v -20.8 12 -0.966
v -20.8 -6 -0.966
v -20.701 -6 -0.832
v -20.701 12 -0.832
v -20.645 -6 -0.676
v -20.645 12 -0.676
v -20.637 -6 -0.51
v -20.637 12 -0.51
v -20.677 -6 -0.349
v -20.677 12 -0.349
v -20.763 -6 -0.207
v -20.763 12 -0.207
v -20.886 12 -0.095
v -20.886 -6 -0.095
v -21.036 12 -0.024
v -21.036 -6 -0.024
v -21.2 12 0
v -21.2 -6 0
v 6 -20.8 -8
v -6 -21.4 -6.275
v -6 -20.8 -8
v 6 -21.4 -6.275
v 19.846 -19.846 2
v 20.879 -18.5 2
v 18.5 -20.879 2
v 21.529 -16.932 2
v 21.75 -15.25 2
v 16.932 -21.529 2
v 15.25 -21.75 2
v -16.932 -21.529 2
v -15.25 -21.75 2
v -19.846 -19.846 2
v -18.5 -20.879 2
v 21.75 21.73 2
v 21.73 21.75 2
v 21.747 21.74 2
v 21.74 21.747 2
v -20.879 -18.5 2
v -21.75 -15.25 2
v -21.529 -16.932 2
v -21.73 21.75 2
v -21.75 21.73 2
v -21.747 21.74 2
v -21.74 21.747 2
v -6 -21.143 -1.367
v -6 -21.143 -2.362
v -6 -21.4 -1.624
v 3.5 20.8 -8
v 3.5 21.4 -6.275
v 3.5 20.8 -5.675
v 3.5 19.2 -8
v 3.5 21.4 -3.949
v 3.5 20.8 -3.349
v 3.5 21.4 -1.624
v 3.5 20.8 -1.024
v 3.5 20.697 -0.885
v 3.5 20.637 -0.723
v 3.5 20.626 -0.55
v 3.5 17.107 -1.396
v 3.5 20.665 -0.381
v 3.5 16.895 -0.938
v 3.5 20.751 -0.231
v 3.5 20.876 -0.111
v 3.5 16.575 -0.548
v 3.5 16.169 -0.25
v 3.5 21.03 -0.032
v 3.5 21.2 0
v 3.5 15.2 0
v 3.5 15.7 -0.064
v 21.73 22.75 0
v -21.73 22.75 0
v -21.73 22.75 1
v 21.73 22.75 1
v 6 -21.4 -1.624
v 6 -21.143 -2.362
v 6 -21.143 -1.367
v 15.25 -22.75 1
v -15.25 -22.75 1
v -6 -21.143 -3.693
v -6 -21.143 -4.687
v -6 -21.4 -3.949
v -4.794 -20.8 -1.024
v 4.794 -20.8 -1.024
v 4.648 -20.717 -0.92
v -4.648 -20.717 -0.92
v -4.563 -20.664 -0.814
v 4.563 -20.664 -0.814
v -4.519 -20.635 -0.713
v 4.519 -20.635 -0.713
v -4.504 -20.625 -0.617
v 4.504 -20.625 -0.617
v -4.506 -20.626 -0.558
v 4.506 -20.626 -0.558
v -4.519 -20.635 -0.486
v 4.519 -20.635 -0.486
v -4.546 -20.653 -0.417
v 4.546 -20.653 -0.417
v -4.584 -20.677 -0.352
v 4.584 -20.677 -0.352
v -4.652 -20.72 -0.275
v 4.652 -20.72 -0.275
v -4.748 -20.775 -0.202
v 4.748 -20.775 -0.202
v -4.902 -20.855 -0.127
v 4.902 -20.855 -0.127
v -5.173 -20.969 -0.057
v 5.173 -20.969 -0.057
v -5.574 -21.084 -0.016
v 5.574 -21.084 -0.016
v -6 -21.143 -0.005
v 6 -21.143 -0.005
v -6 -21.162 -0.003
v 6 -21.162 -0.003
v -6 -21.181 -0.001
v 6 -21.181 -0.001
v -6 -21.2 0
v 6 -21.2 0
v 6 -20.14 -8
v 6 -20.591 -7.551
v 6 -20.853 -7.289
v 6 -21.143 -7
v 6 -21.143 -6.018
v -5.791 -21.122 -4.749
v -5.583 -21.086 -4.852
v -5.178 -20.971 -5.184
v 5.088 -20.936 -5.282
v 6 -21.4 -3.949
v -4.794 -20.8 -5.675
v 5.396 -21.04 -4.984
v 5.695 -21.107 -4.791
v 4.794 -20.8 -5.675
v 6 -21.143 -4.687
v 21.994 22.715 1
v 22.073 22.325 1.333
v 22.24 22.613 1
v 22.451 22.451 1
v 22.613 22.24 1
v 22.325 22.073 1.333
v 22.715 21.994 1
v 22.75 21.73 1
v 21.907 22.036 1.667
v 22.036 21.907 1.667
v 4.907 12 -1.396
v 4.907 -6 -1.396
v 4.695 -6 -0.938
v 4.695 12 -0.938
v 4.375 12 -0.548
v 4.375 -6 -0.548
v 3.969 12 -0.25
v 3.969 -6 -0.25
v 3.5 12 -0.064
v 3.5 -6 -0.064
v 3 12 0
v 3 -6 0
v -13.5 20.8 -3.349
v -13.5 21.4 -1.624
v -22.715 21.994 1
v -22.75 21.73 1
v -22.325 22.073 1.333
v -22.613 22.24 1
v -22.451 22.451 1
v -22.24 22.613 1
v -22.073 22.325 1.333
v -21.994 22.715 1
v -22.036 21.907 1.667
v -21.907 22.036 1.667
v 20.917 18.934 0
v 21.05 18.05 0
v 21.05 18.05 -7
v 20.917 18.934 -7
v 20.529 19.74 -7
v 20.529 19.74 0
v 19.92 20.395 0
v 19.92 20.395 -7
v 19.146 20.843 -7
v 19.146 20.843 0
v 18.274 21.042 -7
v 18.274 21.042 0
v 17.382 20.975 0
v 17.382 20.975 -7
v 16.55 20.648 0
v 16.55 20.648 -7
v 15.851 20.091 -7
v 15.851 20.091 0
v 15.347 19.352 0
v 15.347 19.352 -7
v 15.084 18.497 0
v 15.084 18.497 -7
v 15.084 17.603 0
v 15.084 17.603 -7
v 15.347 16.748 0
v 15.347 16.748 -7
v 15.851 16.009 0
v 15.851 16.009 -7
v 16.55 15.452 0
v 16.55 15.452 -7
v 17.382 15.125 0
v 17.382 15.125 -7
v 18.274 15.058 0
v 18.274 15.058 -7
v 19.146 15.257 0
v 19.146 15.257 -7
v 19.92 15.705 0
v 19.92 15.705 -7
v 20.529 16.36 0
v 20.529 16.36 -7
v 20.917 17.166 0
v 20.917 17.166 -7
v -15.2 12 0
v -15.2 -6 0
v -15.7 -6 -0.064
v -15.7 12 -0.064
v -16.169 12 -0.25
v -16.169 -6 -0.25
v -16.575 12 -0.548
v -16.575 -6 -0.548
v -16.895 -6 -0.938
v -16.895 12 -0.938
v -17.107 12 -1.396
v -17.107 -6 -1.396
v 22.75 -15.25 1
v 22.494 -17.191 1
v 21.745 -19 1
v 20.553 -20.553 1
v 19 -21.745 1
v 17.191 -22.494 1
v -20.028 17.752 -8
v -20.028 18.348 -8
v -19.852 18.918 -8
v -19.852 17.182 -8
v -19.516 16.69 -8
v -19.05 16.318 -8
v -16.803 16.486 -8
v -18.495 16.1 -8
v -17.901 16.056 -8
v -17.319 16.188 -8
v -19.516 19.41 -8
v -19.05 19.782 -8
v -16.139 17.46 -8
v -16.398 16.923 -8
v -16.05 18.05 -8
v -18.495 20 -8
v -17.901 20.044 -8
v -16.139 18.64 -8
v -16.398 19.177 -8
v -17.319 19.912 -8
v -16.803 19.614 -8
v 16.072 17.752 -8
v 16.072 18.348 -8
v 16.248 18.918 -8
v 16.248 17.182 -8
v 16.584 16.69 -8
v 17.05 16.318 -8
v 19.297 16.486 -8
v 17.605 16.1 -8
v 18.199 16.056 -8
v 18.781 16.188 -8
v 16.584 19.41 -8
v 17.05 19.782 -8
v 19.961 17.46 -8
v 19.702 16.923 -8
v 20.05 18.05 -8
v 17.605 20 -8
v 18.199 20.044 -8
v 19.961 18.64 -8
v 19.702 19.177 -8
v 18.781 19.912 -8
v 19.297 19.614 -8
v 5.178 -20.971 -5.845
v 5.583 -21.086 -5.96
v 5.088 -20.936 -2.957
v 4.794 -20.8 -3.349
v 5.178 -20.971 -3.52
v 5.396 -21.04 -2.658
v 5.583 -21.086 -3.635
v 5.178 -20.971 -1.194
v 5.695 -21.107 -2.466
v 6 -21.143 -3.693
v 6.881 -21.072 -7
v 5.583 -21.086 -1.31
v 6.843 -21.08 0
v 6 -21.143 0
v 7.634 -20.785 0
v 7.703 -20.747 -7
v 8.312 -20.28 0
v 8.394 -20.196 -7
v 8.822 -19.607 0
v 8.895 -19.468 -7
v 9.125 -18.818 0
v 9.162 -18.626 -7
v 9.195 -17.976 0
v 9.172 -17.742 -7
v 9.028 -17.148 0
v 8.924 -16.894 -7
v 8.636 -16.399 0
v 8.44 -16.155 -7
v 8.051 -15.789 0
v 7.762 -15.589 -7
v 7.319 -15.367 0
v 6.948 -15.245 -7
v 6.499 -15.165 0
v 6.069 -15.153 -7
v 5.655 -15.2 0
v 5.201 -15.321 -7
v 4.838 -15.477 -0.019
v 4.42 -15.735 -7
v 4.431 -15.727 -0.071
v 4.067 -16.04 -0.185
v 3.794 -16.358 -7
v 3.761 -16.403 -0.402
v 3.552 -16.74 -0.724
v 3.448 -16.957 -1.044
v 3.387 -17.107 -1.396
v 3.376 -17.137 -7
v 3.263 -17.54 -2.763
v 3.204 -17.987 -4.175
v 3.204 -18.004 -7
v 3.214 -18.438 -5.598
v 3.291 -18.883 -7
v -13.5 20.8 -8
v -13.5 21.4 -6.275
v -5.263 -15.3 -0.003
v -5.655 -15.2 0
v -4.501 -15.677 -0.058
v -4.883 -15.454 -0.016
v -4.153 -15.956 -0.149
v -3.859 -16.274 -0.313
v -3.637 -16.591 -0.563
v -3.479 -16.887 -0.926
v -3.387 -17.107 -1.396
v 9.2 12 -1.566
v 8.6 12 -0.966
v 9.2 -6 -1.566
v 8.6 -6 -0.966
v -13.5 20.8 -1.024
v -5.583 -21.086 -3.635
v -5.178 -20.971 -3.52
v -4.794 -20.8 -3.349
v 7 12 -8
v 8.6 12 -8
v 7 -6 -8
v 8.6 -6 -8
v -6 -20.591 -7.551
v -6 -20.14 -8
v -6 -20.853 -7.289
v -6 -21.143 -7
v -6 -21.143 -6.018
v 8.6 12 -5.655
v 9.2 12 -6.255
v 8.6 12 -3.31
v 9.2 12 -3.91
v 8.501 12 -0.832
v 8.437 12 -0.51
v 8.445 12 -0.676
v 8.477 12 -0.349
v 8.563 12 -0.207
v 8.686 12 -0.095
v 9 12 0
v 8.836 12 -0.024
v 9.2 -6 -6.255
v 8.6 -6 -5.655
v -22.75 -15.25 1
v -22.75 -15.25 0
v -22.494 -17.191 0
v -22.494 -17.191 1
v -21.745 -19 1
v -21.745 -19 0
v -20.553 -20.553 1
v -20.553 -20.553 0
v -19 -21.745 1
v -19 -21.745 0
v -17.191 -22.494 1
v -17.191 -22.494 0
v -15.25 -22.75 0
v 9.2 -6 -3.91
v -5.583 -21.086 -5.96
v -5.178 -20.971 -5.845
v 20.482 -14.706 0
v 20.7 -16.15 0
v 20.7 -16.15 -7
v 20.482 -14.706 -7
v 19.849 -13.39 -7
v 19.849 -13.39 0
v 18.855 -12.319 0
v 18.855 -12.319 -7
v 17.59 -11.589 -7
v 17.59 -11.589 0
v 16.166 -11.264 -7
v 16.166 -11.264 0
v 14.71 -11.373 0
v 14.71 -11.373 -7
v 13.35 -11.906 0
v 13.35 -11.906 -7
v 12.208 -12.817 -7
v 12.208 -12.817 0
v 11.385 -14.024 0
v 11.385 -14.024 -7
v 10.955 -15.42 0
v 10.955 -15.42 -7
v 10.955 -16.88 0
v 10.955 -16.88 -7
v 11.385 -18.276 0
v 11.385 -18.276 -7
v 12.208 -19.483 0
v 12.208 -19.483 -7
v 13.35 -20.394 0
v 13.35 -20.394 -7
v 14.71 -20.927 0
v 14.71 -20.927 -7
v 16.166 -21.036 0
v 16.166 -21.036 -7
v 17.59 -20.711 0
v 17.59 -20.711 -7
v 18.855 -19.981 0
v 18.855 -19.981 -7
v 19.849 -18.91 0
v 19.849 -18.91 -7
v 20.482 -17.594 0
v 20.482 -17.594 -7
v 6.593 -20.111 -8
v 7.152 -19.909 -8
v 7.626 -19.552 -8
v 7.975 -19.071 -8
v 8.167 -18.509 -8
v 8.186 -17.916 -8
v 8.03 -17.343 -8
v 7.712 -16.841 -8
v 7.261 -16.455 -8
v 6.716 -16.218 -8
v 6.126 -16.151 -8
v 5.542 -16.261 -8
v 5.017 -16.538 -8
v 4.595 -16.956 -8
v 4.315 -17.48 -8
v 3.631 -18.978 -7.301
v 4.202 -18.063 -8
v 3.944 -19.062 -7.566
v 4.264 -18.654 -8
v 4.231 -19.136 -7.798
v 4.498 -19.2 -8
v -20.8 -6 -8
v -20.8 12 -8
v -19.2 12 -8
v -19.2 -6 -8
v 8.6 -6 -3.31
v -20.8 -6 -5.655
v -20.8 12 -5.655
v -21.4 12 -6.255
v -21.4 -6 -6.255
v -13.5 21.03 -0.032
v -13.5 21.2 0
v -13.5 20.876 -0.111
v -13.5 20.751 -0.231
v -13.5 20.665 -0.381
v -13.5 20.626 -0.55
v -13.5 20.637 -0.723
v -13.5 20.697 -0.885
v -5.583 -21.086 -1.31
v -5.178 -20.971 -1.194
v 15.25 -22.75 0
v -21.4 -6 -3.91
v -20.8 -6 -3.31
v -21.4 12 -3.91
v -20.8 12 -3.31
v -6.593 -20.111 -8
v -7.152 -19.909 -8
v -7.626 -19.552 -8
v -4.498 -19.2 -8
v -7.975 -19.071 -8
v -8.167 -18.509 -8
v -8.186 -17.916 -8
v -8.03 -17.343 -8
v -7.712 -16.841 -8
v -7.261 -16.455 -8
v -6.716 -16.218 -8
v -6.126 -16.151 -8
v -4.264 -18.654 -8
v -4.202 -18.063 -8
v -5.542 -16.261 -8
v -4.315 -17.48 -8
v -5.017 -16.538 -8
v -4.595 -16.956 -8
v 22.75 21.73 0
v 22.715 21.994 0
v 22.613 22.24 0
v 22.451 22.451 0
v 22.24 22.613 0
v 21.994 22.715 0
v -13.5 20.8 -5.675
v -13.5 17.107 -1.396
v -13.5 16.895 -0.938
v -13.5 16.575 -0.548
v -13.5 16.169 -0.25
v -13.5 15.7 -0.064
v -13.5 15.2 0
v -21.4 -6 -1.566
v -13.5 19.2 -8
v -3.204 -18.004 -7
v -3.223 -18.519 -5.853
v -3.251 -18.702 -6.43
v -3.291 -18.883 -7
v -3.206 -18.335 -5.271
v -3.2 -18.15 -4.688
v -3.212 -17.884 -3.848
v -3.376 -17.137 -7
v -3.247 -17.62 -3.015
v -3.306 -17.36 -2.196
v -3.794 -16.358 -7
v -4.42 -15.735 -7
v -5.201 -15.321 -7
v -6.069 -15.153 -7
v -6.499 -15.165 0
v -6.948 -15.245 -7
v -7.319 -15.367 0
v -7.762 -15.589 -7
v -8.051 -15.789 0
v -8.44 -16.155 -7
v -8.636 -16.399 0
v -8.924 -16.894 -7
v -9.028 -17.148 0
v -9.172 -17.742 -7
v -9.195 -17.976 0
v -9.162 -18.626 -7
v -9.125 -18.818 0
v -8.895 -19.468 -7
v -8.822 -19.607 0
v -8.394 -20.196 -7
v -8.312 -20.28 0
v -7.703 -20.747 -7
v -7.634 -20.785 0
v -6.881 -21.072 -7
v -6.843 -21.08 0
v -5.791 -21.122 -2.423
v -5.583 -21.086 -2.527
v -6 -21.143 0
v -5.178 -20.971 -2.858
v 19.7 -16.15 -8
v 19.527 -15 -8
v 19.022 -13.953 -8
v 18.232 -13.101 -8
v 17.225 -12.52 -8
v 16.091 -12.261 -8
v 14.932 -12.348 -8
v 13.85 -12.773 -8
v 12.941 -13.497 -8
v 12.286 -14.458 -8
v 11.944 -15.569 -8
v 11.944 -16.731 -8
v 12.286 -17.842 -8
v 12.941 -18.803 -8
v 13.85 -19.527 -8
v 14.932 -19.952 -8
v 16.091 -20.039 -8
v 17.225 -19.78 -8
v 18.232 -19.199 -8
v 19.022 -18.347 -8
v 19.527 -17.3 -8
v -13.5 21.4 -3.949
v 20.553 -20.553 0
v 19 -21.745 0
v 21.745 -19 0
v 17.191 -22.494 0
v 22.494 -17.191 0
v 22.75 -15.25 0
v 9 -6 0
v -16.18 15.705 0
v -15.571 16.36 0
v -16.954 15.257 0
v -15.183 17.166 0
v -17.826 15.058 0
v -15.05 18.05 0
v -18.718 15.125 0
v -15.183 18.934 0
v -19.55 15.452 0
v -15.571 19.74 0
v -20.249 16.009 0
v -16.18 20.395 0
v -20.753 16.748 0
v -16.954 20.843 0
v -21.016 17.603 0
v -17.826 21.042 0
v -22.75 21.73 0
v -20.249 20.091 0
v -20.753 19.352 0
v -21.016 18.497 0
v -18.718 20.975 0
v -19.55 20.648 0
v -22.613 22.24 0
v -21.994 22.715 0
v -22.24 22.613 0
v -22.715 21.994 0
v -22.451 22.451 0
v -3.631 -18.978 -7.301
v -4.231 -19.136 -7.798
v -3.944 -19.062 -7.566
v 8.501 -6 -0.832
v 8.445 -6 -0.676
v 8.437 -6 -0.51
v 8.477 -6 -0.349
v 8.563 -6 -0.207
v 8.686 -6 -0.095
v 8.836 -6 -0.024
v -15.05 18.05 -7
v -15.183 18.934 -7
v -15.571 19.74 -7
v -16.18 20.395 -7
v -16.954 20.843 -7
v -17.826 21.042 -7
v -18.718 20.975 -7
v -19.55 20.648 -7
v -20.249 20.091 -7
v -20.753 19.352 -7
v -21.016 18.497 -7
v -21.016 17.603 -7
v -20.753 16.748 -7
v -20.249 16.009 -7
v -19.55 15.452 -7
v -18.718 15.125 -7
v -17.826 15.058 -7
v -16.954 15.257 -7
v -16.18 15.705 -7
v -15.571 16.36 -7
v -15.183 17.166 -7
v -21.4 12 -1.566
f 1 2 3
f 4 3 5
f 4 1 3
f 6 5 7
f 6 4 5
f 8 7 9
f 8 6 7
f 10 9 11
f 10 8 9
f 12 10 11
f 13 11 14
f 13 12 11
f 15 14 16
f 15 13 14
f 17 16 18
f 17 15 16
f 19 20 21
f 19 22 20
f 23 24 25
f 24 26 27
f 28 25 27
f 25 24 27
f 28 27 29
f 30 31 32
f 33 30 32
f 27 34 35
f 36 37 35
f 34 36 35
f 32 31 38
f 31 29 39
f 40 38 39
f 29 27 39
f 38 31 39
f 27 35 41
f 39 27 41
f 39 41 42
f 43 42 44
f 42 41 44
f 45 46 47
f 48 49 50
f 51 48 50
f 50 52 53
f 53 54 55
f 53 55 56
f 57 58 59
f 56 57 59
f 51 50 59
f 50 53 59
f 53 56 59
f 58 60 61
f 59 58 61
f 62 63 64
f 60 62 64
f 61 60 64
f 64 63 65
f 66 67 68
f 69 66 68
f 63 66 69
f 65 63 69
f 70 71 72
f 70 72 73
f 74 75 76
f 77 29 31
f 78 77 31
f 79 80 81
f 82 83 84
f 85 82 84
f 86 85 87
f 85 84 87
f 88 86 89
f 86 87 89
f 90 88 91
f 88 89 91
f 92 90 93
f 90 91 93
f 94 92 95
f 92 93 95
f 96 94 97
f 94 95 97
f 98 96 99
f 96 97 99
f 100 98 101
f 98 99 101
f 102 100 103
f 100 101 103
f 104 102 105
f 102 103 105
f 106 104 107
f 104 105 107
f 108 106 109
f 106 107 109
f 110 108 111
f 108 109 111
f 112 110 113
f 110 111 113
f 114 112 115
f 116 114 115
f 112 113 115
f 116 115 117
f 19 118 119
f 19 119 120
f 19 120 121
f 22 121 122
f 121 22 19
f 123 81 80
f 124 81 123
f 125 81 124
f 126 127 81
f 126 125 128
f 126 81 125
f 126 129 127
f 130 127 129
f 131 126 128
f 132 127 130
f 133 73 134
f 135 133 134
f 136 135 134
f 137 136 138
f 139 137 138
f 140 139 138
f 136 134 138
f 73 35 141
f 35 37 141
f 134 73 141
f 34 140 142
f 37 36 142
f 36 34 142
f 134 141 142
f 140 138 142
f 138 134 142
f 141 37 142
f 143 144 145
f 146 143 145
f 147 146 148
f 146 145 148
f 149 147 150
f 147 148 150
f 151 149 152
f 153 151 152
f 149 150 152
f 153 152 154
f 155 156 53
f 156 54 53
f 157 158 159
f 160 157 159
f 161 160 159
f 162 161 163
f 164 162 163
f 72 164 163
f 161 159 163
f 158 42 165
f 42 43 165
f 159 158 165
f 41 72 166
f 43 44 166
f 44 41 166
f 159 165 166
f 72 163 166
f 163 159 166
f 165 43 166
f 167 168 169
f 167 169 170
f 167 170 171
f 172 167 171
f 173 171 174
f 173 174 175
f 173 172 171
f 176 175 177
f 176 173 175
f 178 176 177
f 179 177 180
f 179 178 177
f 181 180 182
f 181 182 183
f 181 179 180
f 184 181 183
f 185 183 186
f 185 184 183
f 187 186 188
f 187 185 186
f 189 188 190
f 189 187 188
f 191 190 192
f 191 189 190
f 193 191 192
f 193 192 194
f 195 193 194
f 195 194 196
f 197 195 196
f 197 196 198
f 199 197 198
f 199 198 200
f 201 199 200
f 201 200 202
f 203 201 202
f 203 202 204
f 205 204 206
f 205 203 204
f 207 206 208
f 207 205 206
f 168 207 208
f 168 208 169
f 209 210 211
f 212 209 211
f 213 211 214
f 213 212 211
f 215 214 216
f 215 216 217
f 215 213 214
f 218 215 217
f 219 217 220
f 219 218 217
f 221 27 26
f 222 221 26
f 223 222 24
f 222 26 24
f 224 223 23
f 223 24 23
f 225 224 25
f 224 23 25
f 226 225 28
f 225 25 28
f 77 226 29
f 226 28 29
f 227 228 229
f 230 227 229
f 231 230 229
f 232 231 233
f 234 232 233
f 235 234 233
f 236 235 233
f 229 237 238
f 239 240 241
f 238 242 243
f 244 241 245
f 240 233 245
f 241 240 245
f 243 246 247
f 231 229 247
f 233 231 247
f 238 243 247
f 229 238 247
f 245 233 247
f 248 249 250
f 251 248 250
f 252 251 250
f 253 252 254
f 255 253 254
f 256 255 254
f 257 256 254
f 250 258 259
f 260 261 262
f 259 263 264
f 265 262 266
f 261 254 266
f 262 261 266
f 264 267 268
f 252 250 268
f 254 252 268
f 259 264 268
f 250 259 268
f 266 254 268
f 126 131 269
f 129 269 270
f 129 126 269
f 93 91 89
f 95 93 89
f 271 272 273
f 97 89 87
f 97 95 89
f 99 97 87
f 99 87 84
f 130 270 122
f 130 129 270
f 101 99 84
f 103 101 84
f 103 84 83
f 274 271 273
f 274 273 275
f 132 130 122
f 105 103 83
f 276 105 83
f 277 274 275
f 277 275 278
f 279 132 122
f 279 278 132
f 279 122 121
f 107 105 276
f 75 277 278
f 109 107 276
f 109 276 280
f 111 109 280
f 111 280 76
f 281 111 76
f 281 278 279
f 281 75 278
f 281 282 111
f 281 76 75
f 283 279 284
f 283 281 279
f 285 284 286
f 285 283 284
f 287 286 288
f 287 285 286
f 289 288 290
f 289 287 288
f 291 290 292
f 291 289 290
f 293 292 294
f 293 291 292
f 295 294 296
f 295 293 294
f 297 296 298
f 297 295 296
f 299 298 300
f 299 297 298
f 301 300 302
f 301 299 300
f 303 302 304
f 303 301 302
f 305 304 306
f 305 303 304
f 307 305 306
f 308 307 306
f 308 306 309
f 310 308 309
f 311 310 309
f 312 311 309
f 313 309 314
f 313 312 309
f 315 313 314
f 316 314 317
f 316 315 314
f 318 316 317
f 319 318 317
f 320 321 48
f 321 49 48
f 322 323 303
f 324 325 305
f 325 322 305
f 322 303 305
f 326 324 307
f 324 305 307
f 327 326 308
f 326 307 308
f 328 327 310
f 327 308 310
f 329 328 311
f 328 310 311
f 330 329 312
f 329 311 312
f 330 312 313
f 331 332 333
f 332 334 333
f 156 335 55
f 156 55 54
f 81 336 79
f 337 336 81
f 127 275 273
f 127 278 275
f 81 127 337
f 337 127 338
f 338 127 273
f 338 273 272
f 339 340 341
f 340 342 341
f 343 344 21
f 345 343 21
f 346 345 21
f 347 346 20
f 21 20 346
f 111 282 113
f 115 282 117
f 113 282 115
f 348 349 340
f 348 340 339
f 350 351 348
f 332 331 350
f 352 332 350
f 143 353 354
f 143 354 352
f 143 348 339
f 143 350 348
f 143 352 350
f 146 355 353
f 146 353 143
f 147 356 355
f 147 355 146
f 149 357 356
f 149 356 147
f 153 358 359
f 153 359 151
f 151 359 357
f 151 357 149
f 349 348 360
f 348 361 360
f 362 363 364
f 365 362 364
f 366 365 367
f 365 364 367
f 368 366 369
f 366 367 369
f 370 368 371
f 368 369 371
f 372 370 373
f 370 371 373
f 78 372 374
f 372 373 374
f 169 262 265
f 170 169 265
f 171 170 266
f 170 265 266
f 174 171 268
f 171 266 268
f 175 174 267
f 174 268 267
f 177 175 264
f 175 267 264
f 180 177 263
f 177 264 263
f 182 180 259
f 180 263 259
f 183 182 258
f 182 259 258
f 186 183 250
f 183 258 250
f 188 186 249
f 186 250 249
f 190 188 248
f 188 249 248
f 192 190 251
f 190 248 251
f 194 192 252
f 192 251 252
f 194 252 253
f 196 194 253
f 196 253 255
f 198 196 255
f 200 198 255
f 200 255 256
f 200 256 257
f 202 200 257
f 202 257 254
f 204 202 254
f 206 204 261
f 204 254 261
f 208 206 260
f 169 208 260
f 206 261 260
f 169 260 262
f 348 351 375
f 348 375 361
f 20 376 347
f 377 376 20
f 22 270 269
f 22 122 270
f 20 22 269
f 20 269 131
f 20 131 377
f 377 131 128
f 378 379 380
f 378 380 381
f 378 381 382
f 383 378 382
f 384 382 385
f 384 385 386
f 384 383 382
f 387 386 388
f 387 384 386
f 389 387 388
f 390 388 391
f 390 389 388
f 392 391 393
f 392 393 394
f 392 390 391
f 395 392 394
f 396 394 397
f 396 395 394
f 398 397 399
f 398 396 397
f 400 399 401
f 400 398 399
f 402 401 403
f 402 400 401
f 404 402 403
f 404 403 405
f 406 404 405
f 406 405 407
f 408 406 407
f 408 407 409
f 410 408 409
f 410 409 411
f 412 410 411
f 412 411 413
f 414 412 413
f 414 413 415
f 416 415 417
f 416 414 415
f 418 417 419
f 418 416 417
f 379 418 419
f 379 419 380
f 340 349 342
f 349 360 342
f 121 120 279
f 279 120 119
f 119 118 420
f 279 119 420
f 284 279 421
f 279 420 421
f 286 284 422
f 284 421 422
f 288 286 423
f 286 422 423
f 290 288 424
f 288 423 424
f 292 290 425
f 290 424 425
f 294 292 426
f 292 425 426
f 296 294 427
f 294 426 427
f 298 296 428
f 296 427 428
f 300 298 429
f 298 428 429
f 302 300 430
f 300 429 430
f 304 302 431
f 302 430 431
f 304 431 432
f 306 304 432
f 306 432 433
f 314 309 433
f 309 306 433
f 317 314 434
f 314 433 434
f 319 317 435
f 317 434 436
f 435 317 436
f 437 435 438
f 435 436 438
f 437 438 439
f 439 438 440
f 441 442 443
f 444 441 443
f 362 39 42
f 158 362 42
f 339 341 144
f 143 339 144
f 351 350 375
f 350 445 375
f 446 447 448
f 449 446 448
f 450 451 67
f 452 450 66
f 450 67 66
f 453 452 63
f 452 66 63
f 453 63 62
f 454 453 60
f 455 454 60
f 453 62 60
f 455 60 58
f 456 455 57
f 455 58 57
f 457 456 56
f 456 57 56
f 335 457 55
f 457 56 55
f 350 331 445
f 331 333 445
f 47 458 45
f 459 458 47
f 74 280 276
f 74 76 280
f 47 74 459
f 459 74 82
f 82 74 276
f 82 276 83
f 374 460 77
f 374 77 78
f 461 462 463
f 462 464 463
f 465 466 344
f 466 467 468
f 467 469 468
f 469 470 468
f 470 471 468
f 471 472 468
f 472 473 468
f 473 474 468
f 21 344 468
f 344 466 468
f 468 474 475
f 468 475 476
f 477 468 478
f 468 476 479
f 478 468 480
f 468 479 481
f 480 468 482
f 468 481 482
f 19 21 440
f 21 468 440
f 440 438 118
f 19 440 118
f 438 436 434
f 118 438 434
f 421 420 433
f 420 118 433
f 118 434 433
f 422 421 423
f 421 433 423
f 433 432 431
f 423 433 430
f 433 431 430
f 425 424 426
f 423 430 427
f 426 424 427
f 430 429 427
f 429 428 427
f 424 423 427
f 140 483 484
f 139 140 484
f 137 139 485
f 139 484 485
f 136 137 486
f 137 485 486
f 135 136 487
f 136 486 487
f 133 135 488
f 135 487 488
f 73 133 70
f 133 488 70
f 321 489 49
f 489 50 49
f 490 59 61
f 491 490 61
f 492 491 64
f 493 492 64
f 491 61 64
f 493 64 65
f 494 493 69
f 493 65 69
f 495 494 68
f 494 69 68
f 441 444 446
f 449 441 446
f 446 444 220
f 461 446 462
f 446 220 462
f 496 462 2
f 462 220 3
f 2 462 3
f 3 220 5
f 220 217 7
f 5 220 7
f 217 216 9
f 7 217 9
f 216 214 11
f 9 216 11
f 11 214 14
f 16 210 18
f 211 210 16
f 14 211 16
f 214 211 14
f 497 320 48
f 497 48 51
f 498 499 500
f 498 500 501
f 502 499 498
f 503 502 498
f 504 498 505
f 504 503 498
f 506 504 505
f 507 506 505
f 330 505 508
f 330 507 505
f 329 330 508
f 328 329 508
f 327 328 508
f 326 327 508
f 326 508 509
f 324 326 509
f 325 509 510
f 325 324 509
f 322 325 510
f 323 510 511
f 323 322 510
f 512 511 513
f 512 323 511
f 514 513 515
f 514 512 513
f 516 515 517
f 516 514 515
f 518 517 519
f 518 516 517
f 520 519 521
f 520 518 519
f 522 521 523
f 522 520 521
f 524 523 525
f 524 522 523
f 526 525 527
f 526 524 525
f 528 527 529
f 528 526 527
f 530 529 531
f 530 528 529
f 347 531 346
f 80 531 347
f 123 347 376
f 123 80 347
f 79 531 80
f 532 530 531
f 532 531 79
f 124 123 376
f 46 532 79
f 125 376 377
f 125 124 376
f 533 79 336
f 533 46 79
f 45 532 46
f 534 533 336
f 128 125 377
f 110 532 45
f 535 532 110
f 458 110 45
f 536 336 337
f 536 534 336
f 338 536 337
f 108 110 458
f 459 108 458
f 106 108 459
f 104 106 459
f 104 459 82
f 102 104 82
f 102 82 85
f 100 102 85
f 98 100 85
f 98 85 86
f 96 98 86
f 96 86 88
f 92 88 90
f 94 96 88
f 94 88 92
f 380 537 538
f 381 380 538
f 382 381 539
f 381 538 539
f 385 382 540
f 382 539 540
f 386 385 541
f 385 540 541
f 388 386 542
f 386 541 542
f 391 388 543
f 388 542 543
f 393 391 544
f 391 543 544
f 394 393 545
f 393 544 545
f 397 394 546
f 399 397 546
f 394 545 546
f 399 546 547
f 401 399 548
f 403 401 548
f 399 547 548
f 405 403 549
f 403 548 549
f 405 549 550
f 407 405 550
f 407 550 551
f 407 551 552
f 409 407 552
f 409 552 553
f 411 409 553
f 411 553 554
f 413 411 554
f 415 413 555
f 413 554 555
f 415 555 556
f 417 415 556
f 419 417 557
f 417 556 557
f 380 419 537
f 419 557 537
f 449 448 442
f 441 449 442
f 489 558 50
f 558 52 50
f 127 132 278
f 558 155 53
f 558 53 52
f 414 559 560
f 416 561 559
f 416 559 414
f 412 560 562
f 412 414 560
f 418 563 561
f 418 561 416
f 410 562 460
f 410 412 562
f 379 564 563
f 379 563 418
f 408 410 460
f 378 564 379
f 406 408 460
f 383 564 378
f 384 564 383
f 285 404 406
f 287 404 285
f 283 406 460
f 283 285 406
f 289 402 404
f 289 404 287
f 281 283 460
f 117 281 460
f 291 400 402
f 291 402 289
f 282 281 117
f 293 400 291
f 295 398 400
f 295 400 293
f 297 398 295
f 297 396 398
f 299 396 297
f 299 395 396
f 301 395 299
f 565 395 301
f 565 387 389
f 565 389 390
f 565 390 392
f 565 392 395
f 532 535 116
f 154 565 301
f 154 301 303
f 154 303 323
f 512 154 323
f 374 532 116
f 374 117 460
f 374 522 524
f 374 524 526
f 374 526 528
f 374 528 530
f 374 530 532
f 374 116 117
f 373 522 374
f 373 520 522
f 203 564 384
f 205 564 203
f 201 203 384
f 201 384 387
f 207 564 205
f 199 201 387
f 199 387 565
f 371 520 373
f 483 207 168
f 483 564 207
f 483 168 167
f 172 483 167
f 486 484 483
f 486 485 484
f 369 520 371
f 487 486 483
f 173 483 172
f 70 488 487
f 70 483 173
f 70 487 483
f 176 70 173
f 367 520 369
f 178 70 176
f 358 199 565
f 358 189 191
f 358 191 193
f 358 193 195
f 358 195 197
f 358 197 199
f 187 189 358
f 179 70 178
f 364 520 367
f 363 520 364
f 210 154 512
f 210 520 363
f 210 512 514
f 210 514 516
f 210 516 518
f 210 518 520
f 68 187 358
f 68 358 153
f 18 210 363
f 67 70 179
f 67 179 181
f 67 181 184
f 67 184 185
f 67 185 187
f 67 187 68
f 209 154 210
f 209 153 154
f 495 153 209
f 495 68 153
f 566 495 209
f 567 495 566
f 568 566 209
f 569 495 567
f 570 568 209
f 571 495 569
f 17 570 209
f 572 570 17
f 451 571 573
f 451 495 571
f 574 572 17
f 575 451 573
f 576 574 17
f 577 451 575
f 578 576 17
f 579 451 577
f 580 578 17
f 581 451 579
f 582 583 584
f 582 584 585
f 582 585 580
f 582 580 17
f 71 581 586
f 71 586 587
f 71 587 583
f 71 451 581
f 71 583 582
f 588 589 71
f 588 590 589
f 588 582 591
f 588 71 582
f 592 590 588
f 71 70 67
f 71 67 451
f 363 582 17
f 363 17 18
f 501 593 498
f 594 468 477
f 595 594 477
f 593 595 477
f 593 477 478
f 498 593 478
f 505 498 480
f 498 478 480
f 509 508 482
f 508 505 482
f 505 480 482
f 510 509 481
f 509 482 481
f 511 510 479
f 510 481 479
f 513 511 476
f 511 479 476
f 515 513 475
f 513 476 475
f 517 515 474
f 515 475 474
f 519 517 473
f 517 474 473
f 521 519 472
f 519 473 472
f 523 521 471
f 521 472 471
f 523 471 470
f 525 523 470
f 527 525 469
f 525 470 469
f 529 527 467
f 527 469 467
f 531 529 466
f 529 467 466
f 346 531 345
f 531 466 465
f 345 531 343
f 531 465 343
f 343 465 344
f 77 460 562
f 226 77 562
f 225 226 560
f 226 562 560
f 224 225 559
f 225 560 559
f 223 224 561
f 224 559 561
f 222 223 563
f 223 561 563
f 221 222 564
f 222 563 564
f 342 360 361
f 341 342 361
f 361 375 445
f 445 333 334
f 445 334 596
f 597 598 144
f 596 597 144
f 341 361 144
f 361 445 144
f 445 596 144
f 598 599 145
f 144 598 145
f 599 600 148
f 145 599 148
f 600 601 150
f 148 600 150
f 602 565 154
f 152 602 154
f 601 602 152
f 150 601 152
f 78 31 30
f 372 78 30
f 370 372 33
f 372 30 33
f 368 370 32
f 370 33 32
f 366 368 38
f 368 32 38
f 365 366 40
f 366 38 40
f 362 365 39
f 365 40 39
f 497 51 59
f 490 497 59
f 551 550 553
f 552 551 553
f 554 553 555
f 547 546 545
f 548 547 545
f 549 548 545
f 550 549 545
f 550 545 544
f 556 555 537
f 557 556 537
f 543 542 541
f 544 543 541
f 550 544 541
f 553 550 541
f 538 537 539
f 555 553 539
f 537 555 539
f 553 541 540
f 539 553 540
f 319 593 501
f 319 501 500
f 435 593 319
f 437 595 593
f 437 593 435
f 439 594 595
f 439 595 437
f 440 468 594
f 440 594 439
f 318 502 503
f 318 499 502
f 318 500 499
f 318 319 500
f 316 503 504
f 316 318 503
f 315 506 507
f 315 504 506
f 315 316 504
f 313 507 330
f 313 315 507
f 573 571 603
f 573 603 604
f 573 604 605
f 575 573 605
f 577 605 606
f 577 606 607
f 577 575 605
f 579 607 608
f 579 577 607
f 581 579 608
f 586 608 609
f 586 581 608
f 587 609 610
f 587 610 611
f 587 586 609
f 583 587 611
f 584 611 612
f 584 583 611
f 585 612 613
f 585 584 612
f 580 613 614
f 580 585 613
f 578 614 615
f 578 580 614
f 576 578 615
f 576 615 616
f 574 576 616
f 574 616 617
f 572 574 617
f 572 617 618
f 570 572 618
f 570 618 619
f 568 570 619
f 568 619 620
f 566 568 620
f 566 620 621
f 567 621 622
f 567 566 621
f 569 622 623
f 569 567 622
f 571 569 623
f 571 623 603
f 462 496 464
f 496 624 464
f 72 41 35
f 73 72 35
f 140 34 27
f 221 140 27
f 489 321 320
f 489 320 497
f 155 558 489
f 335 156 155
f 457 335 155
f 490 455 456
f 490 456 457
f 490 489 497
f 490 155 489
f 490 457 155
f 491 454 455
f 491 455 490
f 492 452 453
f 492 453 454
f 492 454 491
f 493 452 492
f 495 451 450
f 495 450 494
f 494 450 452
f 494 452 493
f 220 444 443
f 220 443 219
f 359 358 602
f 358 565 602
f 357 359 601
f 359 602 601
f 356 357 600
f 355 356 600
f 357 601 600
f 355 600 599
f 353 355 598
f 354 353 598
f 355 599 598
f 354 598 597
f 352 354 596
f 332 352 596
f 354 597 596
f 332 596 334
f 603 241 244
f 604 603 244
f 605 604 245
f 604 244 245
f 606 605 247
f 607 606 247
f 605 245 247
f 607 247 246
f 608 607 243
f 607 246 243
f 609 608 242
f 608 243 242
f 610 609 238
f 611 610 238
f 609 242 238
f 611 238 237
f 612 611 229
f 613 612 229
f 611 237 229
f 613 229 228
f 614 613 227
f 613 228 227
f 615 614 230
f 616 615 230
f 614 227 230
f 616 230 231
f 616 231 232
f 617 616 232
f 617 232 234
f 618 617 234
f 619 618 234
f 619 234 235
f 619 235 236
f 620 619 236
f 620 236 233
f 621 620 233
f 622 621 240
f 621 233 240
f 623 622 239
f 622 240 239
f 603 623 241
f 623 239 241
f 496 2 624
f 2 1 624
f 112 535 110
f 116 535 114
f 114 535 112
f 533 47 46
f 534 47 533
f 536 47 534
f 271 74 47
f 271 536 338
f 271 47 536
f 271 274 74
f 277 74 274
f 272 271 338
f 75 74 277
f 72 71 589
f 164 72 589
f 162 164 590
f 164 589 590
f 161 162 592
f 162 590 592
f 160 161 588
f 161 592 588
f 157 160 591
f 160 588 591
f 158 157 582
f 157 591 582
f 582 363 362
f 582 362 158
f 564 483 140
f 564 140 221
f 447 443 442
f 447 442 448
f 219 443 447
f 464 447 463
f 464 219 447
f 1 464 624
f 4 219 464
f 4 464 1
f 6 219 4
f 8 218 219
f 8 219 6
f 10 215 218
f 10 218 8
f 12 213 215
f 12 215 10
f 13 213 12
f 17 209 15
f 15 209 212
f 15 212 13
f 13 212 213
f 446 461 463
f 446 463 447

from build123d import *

# Parameters (mm, degrees)
PAD001_DEPTH    = 2
SKETCH002_R     = 3
SKETCH002_R_2   = 4.9
PAD002_DEPTH    = 8
CHAMFER_SIZE    = 1
CHAMFER001_SIZE = 1
PAD003_DEPTH    = 9
PAD004_DEPTH    = 6
PAD005_DEPTH    = 8.5


with BuildPart() as part:
    # Sketch001 → Pad001 (new body)
    with BuildSketch(Plane.XY):
        with BuildLine():
            Line((-21.73, 22.75), (21.73, 22.75))
            ThreePointArc((22.75, 21.73), (22.451249, 22.451249), (21.73, 22.75))
            Line((22.75, 21.73), (22.75, -15.25))
            ThreePointArc((15.25, -22.75), (20.553301, -20.553301), (22.75, -15.25))
            Line((15.25, -22.75), (-15.25, -22.75))
            ThreePointArc((-22.75, -15.25), (-20.553301, -20.553301), (-15.25, -22.75))
            Line((-22.75, -15.25), (-22.75, 21.73))
            ThreePointArc((-21.73, 22.75), (-22.451249, 22.451249), (-22.75, 21.73))
        make_face()
    extrude(amount=PAD001_DEPTH)

    # Sketch002 → Pad002 (join)
    with BuildSketch(Plane.XY):
        with Locations((-18.05, 18.05)):
            Circle(SKETCH002_R)
        with Locations((18.05, 18.05)):
            Circle(SKETCH002_R)
        with Locations((6.2, -18.15)):
            Circle(SKETCH002_R)
        with Locations((-6.2, -18.15)):
            Circle(SKETCH002_R)
        with Locations((15.8, -16.15)):
            Circle(SKETCH002_R_2)
    extrude(amount=-PAD002_DEPTH)

    # Chamfer
    chamfer_edges = [part.edges().sort_by_distance(p)[0] for p in [
        (15.05, 18.05, -8),
        (-21.05, 18.05, -8),
        (-9.2, -18.15, -8),
        (3.2, -18.15, -8),
        (10.9, -16.15, -8),
    ]]
    chamfer(chamfer_edges, length=CHAMFER_SIZE)

    # Chamfer001
    chamfer001_edges = [part.edges().sort_by_distance(p)[0] for p in [
        (0, -22.75, 2),
    ]]
    chamfer(chamfer001_edges, length=CHAMFER001_SIZE)

    # Sketch003 → Pad003 (join, symmetric)
    with BuildSketch(Plane.XZ.offset(-3)):
        with BuildLine():
            ThreePointArc((-20.8, -0.965685), (-20.677375, -0.349207), (-21.2, 0))
            Line((-21.2, 0), (-15.2, 0))
            ThreePointArc((-15.2, 0), (-16.381381, -0.386204), (-17.106508, -1.395661))
            Line((-19.2, -8), (-17.106508, -1.395661))
            Line((-20.8, -8), (-19.2, -8))
            Line((-21.4, -6.255228), (-20.8, -8))
            Line((-20.8, -5.655228), (-21.4, -6.255228))
            Line((-21.4, -3.910457), (-20.8, -5.655228))
            Line((-20.8, -3.310457), (-21.4, -3.910457))
            Line((-21.4, -1.565685), (-20.8, -3.310457))
            Line((-20.8, -0.965685), (-21.4, -1.565685))
        make_face()
        with BuildLine():
            Line((3, 0), (9, 0))
            ThreePointArc((9, 0), (8.477375, -0.349207), (8.6, -0.965685))
            Line((8.6, -0.965685), (9.2, -1.565685))
            Line((9.2, -1.565685), (8.6, -3.310457))
            Line((8.6, -3.310457), (9.2, -3.910457))
            Line((9.2, -3.910457), (8.6, -5.655228))
            Line((8.6, -5.655228), (9.2, -6.255228))
            Line((9.2, -6.255228), (8.6, -8))
            Line((8.6, -8), (7, -8))
            Line((7, -8), (4.906508, -1.395661))
            ThreePointArc((4.906508, -1.395661), (4.181381, -0.386204), (3, 0))
        make_face()
    extrude(amount=PAD003_DEPTH, both=True)

    # Sketch004 → Pad004 (join, symmetric)
    with BuildSketch(Plane.YZ):
        with BuildLine():
            ThreePointArc((-20.8, -1.023773), (-20.665406, -0.381157), (-21.2, 0))
            Line((-21.2, 0), (-15.2, 0))
            ThreePointArc((-15.2, 0), (-16.381381, -0.386204), (-17.106508, -1.395661))
            Line((-19.2, -8), (-17.106508, -1.395661))
            Line((-20.8, -8), (-19.2, -8))
            Line((-21.4, -6.274591), (-20.8, -8))
            Line((-20.8, -5.674591), (-21.4, -6.274591))
            Line((-21.4, -3.949182), (-20.8, -5.674591))
            Line((-20.8, -3.349182), (-21.4, -3.949182))
            Line((-21.4, -1.623773), (-20.8, -3.349182))
            Line((-20.8, -1.023773), (-21.4, -1.623773))
        make_face()
    extrude(amount=PAD004_DEPTH, both=True)

    # Sketch005 → Pad005 (join, symmetric)
    with BuildSketch(Plane.YZ.offset(-5)):
        with BuildLine():
            Line((15.2, 0), (21.2, 0))
            ThreePointArc((21.2, 0), (20.665406, -0.381157), (20.8, -1.023773))
            Line((20.8, -1.023773), (21.4, -1.623773))
            Line((21.4, -1.623773), (20.8, -3.349182))
            Line((20.8, -3.349182), (21.4, -3.949182))
            Line((21.4, -3.949182), (20.8, -5.674591))
            Line((20.8, -5.674591), (21.4, -6.274591))
            Line((21.4, -6.274591), (20.8, -8))
            Line((20.8, -8), (19.2, -8))
            Line((19.2, -8), (17.106508, -1.395661))
            ThreePointArc((17.106508, -1.395661), (16.381381, -0.386204), (15.2, 0))
        make_face()
    extrude(amount=PAD005_DEPTH, both=True)


solid = part.part
